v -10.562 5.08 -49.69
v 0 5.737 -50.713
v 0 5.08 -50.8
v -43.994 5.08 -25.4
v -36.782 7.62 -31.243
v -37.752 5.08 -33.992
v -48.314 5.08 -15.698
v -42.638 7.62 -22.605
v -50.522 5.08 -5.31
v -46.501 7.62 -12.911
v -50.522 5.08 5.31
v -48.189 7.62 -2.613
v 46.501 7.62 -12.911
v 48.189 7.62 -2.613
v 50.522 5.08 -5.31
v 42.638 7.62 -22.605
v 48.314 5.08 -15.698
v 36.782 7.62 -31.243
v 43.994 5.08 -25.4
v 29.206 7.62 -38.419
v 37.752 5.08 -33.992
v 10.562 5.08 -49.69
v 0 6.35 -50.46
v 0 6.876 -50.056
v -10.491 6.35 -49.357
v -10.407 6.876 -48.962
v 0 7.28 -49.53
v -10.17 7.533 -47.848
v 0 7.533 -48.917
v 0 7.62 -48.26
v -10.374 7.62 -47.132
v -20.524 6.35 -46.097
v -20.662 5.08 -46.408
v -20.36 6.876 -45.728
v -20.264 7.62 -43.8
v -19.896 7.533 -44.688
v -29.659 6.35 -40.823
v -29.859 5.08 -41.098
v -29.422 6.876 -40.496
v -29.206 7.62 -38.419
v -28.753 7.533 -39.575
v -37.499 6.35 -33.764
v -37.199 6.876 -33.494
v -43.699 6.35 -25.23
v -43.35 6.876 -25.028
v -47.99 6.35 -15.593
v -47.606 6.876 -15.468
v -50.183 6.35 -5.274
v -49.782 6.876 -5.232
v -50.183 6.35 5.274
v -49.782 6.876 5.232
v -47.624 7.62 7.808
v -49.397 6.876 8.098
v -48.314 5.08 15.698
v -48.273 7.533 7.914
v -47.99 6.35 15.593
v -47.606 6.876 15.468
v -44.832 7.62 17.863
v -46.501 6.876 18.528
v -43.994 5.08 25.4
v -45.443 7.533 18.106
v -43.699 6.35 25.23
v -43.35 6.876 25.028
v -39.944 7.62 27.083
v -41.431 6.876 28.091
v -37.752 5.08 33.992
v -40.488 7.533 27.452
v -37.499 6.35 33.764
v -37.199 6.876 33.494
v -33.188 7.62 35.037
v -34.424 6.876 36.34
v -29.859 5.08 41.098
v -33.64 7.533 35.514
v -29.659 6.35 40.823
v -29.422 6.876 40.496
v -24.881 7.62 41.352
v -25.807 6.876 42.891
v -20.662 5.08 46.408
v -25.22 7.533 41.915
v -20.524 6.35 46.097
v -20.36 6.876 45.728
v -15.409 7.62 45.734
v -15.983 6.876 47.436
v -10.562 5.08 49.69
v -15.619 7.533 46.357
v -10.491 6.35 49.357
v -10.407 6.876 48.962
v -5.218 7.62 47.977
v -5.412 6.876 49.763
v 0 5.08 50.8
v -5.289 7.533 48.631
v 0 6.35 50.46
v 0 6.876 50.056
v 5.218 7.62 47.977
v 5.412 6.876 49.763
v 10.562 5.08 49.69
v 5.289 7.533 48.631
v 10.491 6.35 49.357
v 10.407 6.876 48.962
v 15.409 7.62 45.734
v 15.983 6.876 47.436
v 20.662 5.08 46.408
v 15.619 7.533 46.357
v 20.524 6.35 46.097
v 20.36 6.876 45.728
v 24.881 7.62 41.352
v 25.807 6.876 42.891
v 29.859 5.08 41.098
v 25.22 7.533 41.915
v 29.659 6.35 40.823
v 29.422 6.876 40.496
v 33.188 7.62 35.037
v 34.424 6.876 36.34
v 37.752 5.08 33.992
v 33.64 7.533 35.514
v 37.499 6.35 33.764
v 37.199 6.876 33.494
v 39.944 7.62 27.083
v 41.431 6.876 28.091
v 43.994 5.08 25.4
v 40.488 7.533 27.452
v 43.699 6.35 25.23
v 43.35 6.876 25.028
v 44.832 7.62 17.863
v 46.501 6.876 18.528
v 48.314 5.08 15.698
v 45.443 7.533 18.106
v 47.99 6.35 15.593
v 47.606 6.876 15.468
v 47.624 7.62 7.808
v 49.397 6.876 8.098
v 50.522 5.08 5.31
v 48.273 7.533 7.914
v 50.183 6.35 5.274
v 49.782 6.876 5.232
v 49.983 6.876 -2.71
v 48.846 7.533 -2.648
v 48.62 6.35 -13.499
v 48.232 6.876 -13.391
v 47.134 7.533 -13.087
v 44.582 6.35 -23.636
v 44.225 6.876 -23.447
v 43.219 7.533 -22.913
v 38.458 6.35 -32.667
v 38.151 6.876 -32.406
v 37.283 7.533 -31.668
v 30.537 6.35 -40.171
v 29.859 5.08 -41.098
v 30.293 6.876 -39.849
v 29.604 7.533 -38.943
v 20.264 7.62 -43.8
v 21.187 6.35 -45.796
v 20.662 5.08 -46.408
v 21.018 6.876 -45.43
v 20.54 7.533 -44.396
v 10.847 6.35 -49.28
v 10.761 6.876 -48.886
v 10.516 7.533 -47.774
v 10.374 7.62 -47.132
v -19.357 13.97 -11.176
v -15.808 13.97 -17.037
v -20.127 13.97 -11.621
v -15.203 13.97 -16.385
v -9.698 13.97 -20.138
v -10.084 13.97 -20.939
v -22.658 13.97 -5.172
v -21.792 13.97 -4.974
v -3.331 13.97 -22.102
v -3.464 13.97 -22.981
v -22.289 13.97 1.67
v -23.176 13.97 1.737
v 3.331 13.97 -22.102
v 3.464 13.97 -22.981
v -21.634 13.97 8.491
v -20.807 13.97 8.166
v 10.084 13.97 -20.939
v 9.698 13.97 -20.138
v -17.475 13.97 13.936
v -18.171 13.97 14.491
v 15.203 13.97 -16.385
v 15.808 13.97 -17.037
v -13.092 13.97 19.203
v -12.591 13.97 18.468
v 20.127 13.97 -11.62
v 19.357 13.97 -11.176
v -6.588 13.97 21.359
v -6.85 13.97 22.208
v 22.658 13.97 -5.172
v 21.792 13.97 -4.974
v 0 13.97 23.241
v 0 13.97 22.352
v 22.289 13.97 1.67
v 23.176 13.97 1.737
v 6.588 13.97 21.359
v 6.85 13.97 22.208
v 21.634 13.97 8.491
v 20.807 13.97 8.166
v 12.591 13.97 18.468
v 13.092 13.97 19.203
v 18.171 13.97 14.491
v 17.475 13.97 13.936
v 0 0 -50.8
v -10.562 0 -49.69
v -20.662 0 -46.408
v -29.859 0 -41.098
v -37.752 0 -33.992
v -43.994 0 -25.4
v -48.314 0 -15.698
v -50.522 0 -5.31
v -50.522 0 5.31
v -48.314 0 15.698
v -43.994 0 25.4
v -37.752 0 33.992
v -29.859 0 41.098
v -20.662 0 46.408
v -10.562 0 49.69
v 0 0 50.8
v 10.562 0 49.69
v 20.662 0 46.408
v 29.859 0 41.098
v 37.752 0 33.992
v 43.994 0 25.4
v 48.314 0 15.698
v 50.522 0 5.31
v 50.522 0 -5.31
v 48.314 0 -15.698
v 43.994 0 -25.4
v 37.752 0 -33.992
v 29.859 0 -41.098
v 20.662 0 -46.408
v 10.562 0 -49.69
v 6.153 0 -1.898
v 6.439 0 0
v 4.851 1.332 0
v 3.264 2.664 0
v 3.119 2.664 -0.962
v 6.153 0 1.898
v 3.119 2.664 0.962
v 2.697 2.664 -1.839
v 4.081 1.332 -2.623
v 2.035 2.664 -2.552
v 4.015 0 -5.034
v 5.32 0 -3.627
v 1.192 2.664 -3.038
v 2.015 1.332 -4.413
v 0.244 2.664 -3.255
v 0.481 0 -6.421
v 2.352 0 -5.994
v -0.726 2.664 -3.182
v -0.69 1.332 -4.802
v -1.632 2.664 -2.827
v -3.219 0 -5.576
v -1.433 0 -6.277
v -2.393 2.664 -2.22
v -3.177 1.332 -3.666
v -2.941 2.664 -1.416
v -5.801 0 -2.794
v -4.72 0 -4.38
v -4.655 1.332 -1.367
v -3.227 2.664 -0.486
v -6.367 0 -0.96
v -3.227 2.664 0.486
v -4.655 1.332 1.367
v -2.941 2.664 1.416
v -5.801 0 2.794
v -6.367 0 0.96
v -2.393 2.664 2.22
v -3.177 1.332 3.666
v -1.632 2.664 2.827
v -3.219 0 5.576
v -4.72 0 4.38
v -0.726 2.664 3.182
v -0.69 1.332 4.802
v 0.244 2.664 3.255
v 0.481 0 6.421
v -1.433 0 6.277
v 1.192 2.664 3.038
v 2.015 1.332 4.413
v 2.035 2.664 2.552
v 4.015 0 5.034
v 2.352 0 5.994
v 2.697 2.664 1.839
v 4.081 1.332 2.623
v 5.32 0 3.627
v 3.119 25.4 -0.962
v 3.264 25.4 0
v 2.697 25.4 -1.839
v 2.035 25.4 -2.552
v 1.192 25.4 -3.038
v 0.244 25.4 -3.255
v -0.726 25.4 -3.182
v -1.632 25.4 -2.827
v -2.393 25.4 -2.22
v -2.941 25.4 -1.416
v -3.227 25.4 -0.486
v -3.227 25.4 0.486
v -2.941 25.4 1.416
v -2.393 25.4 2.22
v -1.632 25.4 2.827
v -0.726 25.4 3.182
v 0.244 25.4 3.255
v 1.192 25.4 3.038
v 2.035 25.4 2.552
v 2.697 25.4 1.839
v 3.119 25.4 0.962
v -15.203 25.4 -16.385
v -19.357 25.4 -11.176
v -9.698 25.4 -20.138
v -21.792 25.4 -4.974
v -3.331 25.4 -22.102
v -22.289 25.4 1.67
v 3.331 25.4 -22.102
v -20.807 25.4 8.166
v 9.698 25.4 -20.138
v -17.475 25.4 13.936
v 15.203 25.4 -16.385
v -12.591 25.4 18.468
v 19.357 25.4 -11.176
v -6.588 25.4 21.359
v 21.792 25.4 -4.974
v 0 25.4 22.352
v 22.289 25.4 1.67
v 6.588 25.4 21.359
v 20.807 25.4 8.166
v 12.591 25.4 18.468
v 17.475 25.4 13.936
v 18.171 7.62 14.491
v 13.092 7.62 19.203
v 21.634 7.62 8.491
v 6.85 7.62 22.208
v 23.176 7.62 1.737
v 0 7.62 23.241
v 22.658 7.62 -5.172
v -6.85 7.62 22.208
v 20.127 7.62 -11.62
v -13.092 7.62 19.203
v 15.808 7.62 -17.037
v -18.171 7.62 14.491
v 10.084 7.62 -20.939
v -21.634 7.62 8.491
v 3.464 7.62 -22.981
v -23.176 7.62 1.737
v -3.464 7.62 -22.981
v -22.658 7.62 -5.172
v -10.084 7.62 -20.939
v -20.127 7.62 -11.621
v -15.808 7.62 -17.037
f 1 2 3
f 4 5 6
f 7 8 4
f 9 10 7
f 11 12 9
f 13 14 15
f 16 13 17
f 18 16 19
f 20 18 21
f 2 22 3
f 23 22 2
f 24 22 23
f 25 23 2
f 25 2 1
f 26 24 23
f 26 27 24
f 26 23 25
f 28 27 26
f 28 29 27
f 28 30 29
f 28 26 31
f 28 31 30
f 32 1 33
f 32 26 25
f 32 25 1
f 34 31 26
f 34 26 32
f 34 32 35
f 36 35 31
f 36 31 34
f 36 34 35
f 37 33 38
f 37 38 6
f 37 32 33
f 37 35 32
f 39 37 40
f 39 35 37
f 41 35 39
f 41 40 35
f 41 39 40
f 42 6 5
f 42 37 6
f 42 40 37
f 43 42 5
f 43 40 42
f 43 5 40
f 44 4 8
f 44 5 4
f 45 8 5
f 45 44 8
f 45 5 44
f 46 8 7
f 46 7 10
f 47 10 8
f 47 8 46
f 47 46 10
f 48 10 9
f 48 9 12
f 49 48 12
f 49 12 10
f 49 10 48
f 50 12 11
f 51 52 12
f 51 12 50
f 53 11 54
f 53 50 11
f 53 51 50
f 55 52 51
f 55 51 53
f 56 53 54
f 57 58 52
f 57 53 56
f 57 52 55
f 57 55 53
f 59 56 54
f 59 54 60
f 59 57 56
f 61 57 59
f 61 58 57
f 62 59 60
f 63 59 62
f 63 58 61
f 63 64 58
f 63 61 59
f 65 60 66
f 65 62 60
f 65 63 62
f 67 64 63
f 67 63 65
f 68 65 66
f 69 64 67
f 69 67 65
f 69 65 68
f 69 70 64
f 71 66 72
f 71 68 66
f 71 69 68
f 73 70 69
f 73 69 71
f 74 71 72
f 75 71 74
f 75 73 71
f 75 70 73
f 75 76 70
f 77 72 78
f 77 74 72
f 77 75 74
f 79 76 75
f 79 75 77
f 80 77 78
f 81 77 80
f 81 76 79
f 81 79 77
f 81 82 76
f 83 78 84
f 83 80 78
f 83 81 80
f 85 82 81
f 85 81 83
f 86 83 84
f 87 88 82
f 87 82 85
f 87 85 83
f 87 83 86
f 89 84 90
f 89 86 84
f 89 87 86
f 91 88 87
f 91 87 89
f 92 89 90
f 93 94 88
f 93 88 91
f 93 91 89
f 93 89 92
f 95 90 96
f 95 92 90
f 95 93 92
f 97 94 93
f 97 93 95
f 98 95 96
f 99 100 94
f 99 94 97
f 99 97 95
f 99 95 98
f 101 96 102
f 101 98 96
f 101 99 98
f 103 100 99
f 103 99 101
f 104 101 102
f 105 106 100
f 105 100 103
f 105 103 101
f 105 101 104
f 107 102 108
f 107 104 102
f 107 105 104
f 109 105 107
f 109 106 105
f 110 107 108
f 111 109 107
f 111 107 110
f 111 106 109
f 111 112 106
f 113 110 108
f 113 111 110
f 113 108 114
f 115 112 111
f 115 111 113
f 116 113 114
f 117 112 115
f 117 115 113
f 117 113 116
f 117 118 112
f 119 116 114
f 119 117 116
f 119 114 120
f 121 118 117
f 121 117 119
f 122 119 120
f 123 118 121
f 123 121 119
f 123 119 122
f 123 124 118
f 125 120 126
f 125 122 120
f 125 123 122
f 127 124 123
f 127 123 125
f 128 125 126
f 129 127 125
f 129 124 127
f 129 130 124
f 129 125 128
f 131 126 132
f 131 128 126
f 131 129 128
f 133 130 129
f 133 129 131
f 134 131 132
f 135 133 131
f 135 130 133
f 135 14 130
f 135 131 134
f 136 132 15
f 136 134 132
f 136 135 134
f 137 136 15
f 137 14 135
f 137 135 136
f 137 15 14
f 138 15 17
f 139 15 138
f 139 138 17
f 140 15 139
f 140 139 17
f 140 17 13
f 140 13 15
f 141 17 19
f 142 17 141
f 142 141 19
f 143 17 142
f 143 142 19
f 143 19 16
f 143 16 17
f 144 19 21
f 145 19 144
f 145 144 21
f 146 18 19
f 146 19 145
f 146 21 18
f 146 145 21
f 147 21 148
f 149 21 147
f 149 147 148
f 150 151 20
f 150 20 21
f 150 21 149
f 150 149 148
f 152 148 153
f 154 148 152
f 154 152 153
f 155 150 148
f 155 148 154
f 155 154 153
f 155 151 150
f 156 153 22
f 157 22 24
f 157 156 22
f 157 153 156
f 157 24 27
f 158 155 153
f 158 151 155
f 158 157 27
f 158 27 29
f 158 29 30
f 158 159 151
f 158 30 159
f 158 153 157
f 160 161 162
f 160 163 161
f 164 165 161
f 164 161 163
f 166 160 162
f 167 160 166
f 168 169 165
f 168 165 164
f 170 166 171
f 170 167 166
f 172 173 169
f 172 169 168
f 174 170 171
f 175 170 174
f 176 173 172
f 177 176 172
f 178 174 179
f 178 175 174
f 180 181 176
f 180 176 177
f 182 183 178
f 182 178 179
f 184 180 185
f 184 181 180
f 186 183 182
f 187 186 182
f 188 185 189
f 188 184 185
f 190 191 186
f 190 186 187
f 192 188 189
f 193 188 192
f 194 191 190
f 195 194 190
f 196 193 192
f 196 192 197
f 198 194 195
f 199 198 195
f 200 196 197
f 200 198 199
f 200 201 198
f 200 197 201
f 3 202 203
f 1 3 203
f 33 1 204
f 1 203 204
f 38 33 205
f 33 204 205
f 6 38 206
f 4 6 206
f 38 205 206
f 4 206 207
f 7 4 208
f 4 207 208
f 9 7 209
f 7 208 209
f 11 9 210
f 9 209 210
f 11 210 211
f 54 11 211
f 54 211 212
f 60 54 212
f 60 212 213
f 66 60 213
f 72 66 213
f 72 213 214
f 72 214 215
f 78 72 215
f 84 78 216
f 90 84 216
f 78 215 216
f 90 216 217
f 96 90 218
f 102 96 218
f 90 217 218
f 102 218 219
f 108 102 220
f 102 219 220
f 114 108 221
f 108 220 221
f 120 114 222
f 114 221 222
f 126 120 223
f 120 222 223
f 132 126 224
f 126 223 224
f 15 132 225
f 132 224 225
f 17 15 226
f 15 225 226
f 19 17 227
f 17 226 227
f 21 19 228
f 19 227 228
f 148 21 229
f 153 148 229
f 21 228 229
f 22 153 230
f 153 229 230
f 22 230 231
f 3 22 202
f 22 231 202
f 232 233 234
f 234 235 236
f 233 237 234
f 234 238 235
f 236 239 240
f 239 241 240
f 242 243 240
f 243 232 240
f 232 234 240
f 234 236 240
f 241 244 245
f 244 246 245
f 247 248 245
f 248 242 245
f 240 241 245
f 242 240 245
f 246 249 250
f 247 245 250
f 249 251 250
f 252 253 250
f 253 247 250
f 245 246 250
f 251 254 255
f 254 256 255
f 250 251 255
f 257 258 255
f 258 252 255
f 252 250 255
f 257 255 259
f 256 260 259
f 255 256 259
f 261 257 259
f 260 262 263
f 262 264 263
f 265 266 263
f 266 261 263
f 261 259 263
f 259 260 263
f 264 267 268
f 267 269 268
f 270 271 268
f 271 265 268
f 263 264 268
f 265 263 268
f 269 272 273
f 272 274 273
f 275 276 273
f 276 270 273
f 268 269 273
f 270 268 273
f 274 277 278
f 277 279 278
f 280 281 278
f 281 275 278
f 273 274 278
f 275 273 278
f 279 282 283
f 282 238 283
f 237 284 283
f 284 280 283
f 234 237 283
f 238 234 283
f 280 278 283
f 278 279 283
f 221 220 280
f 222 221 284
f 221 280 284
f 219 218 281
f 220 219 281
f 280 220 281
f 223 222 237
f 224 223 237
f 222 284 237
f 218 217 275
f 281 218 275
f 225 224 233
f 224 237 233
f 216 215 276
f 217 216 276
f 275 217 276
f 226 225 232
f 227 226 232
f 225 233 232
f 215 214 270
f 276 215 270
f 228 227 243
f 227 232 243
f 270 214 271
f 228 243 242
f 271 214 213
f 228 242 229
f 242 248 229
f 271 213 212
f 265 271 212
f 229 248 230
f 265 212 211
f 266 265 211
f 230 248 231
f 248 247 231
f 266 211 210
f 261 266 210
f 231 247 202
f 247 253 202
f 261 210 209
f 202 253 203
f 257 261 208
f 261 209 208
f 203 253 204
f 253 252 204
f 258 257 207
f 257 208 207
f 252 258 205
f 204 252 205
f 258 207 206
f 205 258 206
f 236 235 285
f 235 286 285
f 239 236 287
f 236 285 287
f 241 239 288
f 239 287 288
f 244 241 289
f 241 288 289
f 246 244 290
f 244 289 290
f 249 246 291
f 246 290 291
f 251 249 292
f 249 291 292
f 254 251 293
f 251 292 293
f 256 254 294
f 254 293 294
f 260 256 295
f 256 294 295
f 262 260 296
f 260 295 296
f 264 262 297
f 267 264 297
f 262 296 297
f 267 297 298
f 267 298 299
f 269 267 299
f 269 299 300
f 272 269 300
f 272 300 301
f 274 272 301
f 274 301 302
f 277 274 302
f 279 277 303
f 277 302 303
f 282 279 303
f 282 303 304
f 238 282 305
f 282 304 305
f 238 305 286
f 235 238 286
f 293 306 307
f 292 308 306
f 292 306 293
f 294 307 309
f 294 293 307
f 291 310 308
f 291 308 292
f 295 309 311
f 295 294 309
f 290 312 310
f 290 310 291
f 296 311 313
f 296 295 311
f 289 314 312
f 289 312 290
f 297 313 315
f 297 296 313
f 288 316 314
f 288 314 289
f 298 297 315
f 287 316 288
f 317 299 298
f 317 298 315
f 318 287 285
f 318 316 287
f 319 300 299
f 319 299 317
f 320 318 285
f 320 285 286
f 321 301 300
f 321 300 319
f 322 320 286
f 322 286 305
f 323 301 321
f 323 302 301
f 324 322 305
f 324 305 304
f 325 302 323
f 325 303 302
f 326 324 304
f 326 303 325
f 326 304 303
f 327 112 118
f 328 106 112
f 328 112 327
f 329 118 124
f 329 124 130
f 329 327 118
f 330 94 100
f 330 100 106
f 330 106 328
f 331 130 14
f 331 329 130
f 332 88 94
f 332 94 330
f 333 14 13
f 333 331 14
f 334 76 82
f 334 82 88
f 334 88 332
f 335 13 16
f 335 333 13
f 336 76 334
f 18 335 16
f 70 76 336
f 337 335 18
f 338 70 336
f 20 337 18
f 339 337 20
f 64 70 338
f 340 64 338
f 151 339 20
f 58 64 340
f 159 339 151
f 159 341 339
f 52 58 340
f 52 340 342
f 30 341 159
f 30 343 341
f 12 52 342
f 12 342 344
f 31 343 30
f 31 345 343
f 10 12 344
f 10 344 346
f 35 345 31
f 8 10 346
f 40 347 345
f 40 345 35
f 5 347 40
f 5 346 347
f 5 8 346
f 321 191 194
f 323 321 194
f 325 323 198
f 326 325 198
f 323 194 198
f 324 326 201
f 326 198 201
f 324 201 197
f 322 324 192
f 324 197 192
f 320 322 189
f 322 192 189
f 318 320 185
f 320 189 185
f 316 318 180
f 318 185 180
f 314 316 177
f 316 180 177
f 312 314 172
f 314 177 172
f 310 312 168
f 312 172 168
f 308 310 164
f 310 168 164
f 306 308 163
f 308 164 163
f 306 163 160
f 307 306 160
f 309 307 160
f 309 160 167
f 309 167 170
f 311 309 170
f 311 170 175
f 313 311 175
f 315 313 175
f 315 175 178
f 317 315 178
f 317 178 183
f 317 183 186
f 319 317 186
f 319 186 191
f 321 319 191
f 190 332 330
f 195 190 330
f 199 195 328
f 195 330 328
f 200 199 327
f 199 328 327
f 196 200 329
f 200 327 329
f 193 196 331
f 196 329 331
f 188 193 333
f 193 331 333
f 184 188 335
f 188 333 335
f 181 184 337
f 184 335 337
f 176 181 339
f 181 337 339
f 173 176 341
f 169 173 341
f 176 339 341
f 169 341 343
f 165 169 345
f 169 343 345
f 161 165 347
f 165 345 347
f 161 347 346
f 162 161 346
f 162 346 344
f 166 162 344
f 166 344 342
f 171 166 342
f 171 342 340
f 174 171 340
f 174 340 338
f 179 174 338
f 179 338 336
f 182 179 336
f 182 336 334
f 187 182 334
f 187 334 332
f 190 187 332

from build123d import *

# Parameters (mm, degrees)
SKETCH1_R                                           = 50.8
SKETCH1_R_2                                         = 23.241
BOSS_EXTRUDE4_DEPTH                                 = 7.62
SKETCH1_6_R                                         = 23.241
SKETCH1_6_R_2                                       = 22.352
BOSS_EXTRUDE5_DEPTH                                 = 13.97
SKETCH1_7_R                                         = 22.352
BOSS_EXTRUDE6_DEPTH                                 = 25.4
CSK_FOR_1_4_FLAT_HEAD_MACHINE_SCREW_100_D           = 6.5278
CSK_FOR_1_4_FLAT_HEAD_MACHINE_SCREW_100_CSINK_D     = 12.8778
CSK_FOR_1_4_FLAT_HEAD_MACHINE_SCREW_100_CSINK_ANGLE = 100
FILLET3_R                                           = 2.54


with BuildPart() as part:
    # Sketch1 → Boss-Extrude4 (new body)
    with BuildSketch(Plane(origin=(0, 0, 0), x_dir=(1, 0, 0), z_dir=(0, 1, 0))):
        Circle(SKETCH1_R)
        Circle(SKETCH1_R_2, mode=Mode.SUBTRACT)
    extrude(amount=BOSS_EXTRUDE4_DEPTH)

    # Sketch1<6> → Boss-Extrude5 (add)
    with BuildSketch(Plane(origin=(0, 0, 0), x_dir=(1, 0, 0), z_dir=(0, 1, 0))):
        Circle(SKETCH1_6_R)
        Circle(SKETCH1_6_R_2, mode=Mode.SUBTRACT)
    extrude(amount=BOSS_EXTRUDE5_DEPTH)

    # Sketch1<7> → Boss-Extrude6 (add)
    with BuildSketch(Plane(origin=(0, 0, 0), x_dir=(1, 0, 0), z_dir=(0, 1, 0))):
        Circle(SKETCH1_7_R)
    extrude(amount=BOSS_EXTRUDE6_DEPTH)

    # CSK for 1/4 Flat Head Machine Screw (100)1 (through all)
    with Locations(Plane(origin=(0, 0, 0), x_dir=(-1, 0, 0), z_dir=(0, -1, 0))):
        with Locations((0, 0)):
            CounterSinkHole(CSK_FOR_1_4_FLAT_HEAD_MACHINE_SCREW_100_D / 2, CSK_FOR_1_4_FLAT_HEAD_MACHINE_SCREW_100_CSINK_D / 2, counter_sink_angle=CSK_FOR_1_4_FLAT_HEAD_MACHINE_SCREW_100_CSINK_ANGLE)

    # Fillet3
    fillet3_edges = [part.edges().sort_by_distance(p)[0] for p in [
        (-50.8, 7.62, 0),
    ]]
    fillet(fillet3_edges, radius=FILLET3_R)


solid = part.part
